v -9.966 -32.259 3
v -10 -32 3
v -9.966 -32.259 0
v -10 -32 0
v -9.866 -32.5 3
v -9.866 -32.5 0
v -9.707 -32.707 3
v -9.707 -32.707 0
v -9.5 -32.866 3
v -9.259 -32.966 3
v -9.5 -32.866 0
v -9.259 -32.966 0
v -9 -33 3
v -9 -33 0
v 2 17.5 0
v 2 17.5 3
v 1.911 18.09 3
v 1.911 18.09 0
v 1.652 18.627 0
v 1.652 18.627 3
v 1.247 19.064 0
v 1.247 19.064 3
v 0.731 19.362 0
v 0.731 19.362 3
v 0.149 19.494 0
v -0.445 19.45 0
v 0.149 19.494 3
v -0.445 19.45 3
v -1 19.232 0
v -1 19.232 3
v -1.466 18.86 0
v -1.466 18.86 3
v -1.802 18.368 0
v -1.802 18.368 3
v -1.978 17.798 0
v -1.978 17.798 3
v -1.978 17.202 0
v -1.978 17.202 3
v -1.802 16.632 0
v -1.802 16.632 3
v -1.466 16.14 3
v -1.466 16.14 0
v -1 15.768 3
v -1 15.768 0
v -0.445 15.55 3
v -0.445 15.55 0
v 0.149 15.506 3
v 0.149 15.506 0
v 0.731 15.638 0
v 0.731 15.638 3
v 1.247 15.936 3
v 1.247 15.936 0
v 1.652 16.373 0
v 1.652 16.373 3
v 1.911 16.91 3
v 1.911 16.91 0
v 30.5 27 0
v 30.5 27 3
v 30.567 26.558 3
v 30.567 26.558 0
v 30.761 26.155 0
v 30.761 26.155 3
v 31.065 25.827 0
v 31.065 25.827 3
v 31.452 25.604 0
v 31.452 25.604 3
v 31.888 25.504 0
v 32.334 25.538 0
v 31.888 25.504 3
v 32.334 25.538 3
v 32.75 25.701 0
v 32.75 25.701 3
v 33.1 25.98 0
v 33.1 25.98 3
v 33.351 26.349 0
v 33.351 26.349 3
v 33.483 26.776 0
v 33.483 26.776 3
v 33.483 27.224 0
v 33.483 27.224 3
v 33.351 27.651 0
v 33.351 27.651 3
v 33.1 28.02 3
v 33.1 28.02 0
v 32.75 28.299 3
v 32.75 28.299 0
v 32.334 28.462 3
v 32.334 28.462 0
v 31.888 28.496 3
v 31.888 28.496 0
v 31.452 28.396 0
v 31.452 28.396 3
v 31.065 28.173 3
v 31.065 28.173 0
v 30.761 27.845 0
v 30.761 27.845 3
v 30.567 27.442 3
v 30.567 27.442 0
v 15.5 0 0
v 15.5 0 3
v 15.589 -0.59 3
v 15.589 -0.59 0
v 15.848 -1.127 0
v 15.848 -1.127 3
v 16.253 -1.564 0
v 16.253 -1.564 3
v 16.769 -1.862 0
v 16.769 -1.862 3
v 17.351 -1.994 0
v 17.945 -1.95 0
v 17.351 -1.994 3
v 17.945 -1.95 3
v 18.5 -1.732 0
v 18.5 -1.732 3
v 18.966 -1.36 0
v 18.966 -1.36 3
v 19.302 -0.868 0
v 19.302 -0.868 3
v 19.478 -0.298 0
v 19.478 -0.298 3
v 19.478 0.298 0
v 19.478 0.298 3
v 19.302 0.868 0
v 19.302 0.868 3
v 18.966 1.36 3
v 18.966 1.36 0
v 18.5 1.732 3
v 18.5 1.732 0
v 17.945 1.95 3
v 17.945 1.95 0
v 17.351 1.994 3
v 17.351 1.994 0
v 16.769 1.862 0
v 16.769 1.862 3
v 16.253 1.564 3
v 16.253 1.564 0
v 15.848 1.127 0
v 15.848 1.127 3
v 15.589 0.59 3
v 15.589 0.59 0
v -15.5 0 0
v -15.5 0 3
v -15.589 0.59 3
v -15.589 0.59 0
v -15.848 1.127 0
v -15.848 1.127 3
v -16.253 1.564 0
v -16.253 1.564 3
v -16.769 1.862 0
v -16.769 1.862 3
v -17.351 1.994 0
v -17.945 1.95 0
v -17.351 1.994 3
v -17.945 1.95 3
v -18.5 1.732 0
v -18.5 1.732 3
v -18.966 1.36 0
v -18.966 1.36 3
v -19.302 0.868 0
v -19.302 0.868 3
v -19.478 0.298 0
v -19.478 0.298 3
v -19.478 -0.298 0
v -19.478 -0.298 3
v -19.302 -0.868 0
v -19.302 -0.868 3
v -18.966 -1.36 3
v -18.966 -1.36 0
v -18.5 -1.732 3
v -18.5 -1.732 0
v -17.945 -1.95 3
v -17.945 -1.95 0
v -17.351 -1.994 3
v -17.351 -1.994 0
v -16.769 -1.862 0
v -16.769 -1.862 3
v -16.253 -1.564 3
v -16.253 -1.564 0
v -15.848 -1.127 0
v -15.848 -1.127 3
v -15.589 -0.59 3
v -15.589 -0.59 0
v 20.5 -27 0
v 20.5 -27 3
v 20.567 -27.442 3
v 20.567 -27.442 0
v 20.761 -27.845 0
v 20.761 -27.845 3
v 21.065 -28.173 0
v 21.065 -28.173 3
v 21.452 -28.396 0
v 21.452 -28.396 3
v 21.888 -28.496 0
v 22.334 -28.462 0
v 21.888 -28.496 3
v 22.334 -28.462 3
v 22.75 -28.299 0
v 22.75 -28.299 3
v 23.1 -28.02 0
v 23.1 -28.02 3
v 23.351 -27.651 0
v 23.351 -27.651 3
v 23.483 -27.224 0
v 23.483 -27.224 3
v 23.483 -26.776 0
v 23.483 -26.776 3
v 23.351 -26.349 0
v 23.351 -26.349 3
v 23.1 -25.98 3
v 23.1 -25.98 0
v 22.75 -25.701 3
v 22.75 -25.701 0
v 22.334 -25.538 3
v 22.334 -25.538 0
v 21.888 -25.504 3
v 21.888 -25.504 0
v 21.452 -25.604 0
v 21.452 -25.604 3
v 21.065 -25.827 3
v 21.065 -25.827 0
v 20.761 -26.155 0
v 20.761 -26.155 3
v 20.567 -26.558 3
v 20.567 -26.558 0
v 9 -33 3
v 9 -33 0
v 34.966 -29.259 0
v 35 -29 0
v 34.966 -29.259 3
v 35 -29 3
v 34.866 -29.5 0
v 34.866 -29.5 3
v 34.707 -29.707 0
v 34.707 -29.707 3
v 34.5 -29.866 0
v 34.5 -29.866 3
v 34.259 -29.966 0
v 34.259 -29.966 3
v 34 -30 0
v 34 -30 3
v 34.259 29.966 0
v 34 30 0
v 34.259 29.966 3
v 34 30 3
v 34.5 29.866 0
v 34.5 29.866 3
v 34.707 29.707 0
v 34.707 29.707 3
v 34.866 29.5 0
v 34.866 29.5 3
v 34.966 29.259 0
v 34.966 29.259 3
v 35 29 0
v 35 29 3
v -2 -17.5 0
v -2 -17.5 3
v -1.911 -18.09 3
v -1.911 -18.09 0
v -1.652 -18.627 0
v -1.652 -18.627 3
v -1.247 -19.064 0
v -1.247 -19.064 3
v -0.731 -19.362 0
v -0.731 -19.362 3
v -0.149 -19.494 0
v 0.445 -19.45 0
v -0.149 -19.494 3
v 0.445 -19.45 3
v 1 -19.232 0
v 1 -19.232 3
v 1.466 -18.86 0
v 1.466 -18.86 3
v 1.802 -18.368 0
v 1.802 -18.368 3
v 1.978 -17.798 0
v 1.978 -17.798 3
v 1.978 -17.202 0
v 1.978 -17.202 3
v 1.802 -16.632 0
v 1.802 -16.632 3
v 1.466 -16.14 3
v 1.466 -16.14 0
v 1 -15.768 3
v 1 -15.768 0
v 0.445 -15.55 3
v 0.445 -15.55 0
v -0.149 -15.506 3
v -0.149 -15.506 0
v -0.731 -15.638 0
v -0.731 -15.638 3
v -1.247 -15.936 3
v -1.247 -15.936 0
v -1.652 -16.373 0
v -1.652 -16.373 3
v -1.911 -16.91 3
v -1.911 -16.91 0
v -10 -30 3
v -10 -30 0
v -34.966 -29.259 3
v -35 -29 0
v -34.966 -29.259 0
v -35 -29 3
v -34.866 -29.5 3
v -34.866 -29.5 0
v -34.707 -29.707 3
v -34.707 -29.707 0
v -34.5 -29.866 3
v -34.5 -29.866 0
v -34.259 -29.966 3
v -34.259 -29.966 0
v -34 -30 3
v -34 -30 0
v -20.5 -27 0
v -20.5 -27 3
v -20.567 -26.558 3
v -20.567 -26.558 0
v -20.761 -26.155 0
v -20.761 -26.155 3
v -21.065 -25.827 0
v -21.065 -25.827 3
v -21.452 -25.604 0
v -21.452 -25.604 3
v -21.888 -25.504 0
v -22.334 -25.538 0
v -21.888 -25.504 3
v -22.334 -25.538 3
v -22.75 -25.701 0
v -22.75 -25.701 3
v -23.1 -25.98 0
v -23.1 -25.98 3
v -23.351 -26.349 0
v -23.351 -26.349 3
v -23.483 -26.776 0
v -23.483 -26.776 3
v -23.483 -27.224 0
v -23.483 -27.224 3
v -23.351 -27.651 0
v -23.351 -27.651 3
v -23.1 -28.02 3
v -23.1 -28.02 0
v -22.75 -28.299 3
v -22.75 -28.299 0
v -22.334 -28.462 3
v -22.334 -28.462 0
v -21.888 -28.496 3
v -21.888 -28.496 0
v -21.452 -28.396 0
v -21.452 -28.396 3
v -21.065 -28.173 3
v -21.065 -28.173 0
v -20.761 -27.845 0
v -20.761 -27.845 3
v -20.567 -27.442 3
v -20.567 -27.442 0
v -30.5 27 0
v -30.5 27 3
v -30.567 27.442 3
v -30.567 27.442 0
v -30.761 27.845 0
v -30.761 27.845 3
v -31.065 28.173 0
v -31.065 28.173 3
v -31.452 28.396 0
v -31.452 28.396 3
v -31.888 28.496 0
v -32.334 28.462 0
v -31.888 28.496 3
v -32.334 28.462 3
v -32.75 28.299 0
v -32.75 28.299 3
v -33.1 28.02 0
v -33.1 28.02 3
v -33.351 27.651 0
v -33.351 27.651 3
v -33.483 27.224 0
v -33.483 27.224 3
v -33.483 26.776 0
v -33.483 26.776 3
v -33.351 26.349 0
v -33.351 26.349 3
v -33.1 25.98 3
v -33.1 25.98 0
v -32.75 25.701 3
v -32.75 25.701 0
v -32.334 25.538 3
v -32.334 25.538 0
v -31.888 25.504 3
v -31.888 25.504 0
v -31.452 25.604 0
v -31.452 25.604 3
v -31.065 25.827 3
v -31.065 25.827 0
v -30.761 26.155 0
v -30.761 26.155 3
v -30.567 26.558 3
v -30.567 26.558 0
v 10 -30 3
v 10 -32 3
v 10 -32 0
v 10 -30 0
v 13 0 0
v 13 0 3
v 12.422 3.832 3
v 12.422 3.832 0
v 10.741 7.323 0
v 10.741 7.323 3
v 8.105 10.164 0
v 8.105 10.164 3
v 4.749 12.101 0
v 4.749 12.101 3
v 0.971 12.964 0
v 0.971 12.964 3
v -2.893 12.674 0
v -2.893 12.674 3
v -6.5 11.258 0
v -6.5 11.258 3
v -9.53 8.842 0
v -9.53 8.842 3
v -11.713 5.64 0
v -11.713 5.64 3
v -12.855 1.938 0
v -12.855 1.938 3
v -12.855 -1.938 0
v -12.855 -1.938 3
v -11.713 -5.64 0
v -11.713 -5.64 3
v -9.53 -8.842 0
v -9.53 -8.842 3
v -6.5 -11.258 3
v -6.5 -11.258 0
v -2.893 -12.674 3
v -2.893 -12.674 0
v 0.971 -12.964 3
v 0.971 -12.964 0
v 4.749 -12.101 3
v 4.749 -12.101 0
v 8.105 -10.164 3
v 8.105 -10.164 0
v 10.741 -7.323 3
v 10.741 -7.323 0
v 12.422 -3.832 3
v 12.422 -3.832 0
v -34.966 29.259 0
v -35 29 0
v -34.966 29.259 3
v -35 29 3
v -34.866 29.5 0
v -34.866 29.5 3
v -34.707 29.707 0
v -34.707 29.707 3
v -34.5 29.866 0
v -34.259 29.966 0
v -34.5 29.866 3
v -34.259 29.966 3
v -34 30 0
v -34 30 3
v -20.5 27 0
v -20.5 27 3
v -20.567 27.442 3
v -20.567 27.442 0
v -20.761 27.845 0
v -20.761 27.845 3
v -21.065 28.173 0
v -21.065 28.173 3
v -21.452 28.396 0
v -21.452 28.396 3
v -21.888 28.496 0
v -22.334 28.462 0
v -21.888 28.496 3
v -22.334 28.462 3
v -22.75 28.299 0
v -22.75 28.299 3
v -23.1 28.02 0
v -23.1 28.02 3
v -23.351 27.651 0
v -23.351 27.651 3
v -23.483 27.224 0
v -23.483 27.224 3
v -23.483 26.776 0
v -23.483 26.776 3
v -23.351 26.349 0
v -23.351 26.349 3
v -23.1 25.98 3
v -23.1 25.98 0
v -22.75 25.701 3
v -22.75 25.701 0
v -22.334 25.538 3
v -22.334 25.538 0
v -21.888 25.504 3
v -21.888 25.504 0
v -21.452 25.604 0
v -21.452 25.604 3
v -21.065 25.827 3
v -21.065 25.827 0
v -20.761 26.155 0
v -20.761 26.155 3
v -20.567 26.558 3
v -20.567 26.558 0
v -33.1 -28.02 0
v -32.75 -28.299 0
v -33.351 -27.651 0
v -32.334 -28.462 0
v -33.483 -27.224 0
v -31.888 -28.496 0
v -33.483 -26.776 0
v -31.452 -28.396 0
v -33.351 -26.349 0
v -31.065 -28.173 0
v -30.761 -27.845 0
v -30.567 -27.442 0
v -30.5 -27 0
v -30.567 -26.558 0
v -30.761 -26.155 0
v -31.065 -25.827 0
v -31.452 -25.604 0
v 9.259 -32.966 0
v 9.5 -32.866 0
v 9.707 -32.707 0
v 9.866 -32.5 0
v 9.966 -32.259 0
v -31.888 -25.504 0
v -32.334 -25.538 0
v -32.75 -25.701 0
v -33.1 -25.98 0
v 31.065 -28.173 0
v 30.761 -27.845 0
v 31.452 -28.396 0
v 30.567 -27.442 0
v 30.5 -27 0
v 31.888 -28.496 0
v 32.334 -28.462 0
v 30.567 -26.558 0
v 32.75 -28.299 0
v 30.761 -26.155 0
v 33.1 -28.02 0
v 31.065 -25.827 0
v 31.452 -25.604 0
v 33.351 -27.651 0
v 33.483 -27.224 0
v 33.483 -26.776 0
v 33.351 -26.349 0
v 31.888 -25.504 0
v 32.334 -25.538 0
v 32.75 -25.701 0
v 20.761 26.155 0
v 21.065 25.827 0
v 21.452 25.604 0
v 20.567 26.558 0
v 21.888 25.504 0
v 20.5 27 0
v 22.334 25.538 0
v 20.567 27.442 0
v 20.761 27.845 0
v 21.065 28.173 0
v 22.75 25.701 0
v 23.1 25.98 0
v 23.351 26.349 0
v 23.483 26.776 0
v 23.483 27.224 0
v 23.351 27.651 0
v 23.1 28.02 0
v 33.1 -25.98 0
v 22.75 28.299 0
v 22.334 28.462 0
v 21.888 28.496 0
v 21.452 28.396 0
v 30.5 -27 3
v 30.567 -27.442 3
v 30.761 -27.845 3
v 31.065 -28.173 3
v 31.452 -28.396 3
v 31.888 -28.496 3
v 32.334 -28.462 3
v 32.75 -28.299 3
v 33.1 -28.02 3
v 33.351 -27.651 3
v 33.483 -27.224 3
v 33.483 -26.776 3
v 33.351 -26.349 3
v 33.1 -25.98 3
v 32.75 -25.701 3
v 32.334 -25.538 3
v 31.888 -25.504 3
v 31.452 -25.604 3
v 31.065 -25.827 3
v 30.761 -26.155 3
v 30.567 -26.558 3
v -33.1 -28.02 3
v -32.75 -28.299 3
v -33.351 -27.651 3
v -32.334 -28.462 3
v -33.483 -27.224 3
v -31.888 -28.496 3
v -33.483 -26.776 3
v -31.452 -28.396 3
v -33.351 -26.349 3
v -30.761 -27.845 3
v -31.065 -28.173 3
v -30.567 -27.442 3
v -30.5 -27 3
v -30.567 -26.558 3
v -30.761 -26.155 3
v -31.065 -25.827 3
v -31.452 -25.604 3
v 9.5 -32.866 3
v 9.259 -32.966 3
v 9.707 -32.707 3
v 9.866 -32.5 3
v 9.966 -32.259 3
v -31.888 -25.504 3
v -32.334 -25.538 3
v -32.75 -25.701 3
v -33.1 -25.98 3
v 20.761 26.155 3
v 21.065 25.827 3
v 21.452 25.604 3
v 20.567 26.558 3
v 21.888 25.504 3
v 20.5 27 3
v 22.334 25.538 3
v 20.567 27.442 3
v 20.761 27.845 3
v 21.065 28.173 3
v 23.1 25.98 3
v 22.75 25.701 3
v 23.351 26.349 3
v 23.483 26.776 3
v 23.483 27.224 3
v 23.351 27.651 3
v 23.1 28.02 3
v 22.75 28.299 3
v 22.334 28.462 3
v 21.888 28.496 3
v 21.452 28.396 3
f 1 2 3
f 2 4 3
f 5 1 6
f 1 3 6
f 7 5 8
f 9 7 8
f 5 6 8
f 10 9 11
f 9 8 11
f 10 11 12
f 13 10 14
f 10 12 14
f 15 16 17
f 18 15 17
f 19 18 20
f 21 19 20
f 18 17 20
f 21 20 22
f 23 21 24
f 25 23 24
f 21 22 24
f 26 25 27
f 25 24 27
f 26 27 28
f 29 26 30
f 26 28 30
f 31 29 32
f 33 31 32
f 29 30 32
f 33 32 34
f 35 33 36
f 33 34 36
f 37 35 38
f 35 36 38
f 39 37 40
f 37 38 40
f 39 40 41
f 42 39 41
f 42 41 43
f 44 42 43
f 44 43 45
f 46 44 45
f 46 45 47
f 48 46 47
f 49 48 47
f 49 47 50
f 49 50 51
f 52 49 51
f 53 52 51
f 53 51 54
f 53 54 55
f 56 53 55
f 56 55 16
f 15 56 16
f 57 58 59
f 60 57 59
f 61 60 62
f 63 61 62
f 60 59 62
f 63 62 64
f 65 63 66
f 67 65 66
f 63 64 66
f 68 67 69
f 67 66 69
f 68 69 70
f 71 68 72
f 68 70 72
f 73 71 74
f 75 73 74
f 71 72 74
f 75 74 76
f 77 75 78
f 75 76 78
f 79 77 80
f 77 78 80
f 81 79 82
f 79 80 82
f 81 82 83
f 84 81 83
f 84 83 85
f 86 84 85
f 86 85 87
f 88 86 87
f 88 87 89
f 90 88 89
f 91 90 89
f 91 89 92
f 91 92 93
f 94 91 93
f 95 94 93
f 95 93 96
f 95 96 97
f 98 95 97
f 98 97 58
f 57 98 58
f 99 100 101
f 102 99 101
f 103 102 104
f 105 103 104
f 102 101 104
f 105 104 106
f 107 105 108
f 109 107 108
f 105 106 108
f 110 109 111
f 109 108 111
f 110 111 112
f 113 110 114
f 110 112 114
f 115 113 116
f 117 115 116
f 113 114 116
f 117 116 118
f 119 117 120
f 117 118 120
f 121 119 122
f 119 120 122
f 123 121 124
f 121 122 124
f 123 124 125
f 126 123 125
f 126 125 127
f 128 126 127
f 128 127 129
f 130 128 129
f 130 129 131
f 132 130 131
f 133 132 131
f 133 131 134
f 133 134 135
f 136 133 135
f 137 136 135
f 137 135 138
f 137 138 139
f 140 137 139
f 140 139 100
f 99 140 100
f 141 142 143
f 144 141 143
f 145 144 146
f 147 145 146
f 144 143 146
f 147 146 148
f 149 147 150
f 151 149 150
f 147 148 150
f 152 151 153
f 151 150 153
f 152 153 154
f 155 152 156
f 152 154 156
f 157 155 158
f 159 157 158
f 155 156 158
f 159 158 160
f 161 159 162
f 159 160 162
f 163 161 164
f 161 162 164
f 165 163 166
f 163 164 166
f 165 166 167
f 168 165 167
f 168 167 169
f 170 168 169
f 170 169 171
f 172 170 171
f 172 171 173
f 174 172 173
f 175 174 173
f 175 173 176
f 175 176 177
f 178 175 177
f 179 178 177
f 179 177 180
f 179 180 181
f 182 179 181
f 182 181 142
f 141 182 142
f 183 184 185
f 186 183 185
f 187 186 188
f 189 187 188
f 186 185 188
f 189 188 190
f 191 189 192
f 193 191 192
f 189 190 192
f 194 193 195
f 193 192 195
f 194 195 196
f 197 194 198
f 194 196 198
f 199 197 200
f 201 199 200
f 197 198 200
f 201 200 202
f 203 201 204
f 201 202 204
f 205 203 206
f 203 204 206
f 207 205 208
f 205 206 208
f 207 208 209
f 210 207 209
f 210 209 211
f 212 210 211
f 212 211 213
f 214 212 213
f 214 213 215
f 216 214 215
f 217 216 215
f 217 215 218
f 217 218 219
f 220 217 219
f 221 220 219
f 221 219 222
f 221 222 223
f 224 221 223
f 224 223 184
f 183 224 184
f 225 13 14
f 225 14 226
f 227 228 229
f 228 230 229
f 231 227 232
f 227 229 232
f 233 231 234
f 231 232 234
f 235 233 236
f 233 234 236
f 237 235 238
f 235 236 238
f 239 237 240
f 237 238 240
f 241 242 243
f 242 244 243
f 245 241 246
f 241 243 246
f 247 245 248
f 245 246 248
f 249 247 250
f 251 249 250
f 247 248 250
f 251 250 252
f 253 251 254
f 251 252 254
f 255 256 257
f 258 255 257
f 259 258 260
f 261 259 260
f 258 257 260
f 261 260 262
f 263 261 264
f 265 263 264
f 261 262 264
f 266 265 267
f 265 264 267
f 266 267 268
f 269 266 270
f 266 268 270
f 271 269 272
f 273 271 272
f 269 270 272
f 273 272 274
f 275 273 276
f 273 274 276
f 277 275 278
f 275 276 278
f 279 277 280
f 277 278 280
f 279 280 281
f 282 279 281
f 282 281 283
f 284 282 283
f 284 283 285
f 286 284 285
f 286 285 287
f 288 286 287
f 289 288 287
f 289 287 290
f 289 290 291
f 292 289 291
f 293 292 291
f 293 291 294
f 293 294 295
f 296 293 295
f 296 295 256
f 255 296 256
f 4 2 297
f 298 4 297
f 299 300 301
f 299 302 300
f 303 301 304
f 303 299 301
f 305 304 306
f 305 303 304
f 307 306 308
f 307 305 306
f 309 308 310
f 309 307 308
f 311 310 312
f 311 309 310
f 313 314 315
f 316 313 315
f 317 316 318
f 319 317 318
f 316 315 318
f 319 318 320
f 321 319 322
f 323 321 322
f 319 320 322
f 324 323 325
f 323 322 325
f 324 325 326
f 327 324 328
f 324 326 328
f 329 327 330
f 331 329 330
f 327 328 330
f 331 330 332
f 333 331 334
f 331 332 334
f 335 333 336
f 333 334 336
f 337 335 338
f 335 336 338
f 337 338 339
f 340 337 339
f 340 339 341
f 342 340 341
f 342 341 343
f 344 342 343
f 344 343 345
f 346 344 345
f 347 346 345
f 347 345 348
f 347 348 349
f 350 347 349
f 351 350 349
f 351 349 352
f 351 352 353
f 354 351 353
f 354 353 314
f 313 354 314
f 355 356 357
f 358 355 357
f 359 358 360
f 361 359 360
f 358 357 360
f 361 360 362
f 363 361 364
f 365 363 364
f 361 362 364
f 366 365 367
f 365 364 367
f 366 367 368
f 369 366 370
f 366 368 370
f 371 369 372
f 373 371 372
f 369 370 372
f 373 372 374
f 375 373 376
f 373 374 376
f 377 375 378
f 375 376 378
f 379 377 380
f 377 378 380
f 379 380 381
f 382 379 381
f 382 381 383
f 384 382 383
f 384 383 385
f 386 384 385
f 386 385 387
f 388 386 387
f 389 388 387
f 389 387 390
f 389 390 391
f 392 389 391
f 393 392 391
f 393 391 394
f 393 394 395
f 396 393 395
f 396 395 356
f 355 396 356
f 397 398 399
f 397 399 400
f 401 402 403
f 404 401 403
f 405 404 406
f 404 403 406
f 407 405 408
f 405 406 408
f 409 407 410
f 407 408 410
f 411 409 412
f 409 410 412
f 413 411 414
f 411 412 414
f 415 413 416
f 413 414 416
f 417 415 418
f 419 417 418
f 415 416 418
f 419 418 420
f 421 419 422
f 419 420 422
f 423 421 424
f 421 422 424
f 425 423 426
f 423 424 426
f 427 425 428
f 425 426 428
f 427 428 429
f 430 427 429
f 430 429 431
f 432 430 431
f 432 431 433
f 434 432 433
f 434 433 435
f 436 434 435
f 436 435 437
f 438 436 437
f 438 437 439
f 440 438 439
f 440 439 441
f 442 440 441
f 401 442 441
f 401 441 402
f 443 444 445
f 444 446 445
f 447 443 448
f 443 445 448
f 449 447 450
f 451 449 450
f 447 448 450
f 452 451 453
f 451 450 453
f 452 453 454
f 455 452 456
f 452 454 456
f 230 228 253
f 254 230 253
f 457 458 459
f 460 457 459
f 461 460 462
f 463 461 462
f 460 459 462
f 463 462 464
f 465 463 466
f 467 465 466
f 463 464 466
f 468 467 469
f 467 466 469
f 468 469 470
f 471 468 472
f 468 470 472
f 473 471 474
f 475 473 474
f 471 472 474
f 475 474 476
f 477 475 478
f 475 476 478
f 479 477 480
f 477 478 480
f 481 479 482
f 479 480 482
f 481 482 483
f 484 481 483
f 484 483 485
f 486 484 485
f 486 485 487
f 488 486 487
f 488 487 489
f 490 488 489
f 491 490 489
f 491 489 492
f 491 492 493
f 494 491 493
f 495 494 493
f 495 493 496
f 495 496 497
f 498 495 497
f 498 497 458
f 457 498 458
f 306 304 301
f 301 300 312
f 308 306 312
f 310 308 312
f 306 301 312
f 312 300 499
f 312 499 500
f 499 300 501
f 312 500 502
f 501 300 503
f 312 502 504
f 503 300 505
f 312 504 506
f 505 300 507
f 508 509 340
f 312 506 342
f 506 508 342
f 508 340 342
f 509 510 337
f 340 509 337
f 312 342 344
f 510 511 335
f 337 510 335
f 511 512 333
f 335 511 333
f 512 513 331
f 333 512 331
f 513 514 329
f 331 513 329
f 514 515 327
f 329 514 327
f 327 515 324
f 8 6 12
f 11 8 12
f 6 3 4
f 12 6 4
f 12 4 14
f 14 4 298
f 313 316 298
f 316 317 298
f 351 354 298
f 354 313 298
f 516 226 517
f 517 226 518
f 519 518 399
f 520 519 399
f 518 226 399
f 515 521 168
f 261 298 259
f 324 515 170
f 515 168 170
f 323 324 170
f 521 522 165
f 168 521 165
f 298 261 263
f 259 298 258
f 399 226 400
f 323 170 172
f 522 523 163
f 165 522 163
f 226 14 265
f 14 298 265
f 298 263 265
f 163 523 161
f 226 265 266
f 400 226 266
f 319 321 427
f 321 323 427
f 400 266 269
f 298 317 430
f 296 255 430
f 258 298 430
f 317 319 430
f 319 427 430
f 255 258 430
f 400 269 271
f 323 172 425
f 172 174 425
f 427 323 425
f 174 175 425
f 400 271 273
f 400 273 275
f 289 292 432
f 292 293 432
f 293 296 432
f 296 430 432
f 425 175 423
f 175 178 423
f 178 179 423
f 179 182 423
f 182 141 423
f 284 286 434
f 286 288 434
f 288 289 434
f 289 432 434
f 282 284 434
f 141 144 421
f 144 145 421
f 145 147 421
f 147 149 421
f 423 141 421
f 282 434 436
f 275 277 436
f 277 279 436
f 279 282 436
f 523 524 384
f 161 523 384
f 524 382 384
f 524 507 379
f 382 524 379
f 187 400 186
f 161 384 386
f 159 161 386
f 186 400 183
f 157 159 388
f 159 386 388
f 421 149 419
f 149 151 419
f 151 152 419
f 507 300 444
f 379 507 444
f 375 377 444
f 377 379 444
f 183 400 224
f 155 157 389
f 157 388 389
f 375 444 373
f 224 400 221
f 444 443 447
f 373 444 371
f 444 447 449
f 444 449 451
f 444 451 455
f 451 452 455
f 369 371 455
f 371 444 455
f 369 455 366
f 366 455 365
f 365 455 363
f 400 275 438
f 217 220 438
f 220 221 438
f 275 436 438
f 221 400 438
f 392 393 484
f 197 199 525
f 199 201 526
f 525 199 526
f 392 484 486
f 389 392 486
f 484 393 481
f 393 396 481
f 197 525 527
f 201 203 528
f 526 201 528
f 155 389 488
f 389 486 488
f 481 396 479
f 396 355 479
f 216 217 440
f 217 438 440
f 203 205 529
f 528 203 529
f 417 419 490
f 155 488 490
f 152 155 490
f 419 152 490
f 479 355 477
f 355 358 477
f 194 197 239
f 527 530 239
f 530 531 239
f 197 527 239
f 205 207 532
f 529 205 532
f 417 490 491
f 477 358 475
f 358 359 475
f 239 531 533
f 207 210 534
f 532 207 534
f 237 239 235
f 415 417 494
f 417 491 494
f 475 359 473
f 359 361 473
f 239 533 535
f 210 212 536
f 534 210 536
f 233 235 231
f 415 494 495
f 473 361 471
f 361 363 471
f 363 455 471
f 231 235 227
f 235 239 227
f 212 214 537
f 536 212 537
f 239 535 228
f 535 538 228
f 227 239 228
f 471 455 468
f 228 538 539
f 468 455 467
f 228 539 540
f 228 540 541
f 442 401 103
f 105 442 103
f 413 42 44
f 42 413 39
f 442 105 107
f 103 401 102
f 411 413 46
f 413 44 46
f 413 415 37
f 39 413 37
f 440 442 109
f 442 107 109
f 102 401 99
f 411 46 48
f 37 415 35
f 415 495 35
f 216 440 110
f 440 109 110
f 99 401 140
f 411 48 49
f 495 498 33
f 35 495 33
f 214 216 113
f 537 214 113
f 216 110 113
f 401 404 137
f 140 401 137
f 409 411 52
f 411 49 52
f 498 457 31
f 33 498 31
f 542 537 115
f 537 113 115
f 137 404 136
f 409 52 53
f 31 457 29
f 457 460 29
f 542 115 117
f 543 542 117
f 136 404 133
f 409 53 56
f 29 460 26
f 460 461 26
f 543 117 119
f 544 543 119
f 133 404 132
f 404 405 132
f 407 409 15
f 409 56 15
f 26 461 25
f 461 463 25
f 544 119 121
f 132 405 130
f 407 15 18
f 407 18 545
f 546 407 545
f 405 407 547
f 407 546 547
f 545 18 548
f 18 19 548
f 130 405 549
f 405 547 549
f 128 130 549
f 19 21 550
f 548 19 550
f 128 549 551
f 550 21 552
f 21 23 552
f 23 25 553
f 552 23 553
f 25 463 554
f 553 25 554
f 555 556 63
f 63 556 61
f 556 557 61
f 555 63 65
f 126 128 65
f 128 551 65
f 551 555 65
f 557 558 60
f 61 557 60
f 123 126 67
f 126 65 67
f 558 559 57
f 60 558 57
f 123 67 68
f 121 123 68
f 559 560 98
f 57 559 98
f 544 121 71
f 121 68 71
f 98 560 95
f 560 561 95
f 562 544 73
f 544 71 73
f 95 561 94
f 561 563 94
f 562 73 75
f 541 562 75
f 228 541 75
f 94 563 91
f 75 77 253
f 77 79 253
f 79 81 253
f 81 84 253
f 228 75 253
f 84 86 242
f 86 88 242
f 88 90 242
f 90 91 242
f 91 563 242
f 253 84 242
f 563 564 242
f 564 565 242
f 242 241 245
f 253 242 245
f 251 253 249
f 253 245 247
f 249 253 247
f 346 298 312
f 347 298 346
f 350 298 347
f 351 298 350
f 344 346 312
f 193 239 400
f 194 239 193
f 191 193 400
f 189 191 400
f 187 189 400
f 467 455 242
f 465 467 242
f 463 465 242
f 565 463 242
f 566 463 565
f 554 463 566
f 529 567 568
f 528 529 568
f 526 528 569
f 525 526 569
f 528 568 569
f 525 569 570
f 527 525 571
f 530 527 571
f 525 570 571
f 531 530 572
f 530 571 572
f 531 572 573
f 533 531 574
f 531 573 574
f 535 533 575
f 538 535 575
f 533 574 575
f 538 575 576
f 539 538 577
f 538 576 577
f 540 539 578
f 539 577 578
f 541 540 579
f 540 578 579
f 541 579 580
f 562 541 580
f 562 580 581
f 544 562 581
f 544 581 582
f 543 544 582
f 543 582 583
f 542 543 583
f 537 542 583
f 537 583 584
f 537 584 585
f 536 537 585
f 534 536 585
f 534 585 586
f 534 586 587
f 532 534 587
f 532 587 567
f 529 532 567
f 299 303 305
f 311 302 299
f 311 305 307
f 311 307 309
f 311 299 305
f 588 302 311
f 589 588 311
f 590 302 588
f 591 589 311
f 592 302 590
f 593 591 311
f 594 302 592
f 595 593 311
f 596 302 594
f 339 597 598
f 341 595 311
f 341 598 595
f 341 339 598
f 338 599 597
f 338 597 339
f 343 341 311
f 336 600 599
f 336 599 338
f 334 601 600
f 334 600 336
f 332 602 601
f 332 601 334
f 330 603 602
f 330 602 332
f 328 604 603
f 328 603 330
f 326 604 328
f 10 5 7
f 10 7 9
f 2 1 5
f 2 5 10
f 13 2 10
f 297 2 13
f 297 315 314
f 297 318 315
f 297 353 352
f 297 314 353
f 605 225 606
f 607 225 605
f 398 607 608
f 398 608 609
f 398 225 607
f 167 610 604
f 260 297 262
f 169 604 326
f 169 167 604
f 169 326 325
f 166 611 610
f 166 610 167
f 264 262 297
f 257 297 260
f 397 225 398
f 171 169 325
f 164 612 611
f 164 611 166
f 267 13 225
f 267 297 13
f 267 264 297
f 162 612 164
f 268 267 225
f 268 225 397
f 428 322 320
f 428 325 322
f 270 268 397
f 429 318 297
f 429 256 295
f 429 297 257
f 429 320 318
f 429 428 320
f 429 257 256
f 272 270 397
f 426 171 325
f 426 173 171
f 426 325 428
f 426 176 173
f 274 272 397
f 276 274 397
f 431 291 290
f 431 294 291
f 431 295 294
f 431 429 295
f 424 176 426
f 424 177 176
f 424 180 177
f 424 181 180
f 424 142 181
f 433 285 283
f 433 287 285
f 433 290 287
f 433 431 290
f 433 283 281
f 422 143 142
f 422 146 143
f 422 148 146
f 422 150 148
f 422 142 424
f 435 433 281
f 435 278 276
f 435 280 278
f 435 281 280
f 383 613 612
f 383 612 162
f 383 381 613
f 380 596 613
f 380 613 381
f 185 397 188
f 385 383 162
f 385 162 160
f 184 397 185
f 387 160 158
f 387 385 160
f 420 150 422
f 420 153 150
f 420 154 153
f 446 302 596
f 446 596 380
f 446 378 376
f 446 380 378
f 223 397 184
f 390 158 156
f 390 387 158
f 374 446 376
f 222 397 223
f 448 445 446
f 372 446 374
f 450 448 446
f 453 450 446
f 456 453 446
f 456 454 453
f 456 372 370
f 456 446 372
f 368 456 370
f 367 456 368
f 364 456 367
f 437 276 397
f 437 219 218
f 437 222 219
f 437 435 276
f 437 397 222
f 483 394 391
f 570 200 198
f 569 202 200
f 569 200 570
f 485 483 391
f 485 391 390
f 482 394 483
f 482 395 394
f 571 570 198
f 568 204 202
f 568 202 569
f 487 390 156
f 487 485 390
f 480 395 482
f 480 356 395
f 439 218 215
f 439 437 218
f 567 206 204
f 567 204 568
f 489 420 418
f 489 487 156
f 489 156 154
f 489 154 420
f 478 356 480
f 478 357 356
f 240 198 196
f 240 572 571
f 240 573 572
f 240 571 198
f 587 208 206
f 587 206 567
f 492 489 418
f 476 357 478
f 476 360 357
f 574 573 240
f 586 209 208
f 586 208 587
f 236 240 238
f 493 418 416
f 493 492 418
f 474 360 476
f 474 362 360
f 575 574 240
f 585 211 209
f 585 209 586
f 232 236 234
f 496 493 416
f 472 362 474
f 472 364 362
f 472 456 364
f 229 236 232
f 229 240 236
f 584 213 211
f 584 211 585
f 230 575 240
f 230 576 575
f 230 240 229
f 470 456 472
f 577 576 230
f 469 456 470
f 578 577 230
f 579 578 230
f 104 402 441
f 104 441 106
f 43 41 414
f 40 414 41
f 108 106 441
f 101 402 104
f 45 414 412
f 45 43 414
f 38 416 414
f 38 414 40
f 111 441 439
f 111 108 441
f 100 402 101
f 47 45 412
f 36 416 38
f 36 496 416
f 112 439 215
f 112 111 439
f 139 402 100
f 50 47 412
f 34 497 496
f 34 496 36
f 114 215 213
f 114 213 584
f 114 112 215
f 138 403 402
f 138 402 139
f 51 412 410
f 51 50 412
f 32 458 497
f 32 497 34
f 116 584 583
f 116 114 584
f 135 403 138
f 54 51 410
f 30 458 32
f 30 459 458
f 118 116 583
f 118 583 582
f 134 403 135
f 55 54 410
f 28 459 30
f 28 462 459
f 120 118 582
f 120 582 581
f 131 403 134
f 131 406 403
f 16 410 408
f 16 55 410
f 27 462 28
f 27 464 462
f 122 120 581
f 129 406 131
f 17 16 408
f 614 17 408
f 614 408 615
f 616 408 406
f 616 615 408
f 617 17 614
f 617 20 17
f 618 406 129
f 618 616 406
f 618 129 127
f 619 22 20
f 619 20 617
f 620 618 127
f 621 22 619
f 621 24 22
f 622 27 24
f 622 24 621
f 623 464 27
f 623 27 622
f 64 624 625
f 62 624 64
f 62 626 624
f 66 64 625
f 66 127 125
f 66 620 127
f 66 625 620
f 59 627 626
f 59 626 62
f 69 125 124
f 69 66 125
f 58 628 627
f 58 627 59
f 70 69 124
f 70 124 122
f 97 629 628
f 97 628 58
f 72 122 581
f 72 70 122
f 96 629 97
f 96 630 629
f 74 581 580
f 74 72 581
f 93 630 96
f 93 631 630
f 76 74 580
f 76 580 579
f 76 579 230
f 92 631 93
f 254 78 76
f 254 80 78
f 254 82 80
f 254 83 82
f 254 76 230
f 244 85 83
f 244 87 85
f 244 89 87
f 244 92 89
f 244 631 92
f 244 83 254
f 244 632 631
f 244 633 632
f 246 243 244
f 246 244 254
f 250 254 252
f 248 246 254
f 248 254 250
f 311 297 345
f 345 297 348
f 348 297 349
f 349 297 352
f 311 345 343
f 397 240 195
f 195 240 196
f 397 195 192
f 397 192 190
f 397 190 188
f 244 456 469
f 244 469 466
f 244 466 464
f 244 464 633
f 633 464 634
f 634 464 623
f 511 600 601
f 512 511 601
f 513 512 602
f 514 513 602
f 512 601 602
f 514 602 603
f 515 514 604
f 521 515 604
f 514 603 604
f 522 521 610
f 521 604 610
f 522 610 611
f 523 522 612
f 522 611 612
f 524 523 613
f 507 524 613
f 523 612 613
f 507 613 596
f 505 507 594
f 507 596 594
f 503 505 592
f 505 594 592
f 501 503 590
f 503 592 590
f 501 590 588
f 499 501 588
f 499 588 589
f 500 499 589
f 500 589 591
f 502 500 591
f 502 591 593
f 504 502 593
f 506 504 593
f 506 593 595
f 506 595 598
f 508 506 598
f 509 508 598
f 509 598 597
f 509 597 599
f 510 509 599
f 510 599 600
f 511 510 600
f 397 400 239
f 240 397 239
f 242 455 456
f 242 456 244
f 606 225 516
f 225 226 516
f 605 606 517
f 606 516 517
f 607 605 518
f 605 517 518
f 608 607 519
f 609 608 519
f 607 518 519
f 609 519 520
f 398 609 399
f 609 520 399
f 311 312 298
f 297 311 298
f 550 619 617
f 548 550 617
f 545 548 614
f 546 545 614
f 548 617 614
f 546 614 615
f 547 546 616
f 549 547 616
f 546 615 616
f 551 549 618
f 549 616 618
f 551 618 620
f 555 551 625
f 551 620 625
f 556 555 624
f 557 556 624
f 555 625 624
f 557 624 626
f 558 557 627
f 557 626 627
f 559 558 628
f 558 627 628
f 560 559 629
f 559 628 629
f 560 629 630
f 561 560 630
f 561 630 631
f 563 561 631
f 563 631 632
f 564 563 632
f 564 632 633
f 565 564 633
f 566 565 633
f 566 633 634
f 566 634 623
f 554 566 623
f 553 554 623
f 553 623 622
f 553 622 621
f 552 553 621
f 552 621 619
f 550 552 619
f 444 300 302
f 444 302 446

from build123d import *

# Parameters (mm, degrees)
SKETCH_1_W          = 70
SKETCH_1_H          = 60
EXTRUDE_1_DEPTH     = 3
SKETCH_2_R          = 13
CUT_EXTRUDE_1_DEPTH = 47.19523785
SKETCH_3_R          = 2
CUT_EXTRUDE_2_DEPTH = 47.19523785
SKETCH_4_W          = 20
SKETCH_4_H          = 3
EXTRUDE_2_DEPTH     = 3
SKETCH_5_R          = 1.5
CUT_EXTRUDE_3_DEPTH = 49.197510309
SKETCH_6_R          = 1.5
CUT_EXTRUDE_4_DEPTH = 49.197510309
FILLET_1_R          = 1


with BuildPart() as part:
    # 草图1 → 凸台-拉伸1 (new body)
    with BuildSketch(Plane.XY):
        Rectangle(SKETCH_1_W, SKETCH_1_H)
    extrude(amount=EXTRUDE_1_DEPTH)

    # 草图2 → 切除-拉伸1 (cut, through all)
    with BuildSketch(Plane.XY.offset(3)):
        Circle(SKETCH_2_R)
    extrude(amount=-CUT_EXTRUDE_1_DEPTH, mode=Mode.SUBTRACT)

    # 草图3 → 切除-拉伸2 (cut, through all)
    with BuildSketch(Plane.XY.offset(3)):
        with Locations((0, 17.5)):
            Circle(SKETCH_3_R)
        with Locations((-17.5, 0)):
            Circle(SKETCH_3_R)
        with Locations(Location((0, -17.5, 0), (0, 0, 180))):
            Circle(SKETCH_3_R)
        with Locations(Location((17.5, 0, 0), (0, 0, 180))):
            Circle(SKETCH_3_R)
    extrude(amount=-CUT_EXTRUDE_2_DEPTH, mode=Mode.SUBTRACT)

    # 草图4 → 凸台-拉伸2 (add)
    with BuildSketch(Plane.XY.offset(3)):
        with Locations((0, -31.5)):
            Rectangle(SKETCH_4_W, SKETCH_4_H)
    extrude(amount=-EXTRUDE_2_DEPTH)

    # 草图5 → 切除-拉伸3 (cut, through all)
    with BuildSketch(Plane.XY.offset(3)):
        with Locations((-32, 27)):
            Circle(SKETCH_5_R)
        with Locations((-22, 27)):
            Circle(SKETCH_5_R)
        with Locations(Location((22, 27, 0), (0, 0, 180))):
            Circle(SKETCH_5_R)
        with Locations(Location((32, 27, 0), (0, 0, 180))):
            Circle(SKETCH_5_R)
    extrude(amount=-CUT_EXTRUDE_3_DEPTH, mode=Mode.SUBTRACT)

    # 草图6 → 切除-拉伸4 (cut, through all)
    with BuildSketch(Plane.XY.offset(3)):
        with Locations((-32, -27)):
            Circle(SKETCH_6_R)
        with Locations((-22, -27)):
            Circle(SKETCH_6_R)
        with Locations(Location((22, -27, 0), (0, 0, 180))):
            Circle(SKETCH_6_R)
        with Locations(Location((32, -27, 0), (0, 0, 180))):
            Circle(SKETCH_6_R)
    extrude(amount=-CUT_EXTRUDE_4_DEPTH, mode=Mode.SUBTRACT)

    # 圆角1
    fillet_1_edges = [part.edges().sort_by_distance(p)[0] for p in [
        (-10, -33, 1.5),
        (10, -33, 1.5),
        (35, -30, 1.5),
        (-35, -30, 1.5),
        (-35, 30, 1.5),
        (35, 30, 1.5),
    ]]
    fillet(fillet_1_edges, radius=FILLET_1_R)


solid = part.part
